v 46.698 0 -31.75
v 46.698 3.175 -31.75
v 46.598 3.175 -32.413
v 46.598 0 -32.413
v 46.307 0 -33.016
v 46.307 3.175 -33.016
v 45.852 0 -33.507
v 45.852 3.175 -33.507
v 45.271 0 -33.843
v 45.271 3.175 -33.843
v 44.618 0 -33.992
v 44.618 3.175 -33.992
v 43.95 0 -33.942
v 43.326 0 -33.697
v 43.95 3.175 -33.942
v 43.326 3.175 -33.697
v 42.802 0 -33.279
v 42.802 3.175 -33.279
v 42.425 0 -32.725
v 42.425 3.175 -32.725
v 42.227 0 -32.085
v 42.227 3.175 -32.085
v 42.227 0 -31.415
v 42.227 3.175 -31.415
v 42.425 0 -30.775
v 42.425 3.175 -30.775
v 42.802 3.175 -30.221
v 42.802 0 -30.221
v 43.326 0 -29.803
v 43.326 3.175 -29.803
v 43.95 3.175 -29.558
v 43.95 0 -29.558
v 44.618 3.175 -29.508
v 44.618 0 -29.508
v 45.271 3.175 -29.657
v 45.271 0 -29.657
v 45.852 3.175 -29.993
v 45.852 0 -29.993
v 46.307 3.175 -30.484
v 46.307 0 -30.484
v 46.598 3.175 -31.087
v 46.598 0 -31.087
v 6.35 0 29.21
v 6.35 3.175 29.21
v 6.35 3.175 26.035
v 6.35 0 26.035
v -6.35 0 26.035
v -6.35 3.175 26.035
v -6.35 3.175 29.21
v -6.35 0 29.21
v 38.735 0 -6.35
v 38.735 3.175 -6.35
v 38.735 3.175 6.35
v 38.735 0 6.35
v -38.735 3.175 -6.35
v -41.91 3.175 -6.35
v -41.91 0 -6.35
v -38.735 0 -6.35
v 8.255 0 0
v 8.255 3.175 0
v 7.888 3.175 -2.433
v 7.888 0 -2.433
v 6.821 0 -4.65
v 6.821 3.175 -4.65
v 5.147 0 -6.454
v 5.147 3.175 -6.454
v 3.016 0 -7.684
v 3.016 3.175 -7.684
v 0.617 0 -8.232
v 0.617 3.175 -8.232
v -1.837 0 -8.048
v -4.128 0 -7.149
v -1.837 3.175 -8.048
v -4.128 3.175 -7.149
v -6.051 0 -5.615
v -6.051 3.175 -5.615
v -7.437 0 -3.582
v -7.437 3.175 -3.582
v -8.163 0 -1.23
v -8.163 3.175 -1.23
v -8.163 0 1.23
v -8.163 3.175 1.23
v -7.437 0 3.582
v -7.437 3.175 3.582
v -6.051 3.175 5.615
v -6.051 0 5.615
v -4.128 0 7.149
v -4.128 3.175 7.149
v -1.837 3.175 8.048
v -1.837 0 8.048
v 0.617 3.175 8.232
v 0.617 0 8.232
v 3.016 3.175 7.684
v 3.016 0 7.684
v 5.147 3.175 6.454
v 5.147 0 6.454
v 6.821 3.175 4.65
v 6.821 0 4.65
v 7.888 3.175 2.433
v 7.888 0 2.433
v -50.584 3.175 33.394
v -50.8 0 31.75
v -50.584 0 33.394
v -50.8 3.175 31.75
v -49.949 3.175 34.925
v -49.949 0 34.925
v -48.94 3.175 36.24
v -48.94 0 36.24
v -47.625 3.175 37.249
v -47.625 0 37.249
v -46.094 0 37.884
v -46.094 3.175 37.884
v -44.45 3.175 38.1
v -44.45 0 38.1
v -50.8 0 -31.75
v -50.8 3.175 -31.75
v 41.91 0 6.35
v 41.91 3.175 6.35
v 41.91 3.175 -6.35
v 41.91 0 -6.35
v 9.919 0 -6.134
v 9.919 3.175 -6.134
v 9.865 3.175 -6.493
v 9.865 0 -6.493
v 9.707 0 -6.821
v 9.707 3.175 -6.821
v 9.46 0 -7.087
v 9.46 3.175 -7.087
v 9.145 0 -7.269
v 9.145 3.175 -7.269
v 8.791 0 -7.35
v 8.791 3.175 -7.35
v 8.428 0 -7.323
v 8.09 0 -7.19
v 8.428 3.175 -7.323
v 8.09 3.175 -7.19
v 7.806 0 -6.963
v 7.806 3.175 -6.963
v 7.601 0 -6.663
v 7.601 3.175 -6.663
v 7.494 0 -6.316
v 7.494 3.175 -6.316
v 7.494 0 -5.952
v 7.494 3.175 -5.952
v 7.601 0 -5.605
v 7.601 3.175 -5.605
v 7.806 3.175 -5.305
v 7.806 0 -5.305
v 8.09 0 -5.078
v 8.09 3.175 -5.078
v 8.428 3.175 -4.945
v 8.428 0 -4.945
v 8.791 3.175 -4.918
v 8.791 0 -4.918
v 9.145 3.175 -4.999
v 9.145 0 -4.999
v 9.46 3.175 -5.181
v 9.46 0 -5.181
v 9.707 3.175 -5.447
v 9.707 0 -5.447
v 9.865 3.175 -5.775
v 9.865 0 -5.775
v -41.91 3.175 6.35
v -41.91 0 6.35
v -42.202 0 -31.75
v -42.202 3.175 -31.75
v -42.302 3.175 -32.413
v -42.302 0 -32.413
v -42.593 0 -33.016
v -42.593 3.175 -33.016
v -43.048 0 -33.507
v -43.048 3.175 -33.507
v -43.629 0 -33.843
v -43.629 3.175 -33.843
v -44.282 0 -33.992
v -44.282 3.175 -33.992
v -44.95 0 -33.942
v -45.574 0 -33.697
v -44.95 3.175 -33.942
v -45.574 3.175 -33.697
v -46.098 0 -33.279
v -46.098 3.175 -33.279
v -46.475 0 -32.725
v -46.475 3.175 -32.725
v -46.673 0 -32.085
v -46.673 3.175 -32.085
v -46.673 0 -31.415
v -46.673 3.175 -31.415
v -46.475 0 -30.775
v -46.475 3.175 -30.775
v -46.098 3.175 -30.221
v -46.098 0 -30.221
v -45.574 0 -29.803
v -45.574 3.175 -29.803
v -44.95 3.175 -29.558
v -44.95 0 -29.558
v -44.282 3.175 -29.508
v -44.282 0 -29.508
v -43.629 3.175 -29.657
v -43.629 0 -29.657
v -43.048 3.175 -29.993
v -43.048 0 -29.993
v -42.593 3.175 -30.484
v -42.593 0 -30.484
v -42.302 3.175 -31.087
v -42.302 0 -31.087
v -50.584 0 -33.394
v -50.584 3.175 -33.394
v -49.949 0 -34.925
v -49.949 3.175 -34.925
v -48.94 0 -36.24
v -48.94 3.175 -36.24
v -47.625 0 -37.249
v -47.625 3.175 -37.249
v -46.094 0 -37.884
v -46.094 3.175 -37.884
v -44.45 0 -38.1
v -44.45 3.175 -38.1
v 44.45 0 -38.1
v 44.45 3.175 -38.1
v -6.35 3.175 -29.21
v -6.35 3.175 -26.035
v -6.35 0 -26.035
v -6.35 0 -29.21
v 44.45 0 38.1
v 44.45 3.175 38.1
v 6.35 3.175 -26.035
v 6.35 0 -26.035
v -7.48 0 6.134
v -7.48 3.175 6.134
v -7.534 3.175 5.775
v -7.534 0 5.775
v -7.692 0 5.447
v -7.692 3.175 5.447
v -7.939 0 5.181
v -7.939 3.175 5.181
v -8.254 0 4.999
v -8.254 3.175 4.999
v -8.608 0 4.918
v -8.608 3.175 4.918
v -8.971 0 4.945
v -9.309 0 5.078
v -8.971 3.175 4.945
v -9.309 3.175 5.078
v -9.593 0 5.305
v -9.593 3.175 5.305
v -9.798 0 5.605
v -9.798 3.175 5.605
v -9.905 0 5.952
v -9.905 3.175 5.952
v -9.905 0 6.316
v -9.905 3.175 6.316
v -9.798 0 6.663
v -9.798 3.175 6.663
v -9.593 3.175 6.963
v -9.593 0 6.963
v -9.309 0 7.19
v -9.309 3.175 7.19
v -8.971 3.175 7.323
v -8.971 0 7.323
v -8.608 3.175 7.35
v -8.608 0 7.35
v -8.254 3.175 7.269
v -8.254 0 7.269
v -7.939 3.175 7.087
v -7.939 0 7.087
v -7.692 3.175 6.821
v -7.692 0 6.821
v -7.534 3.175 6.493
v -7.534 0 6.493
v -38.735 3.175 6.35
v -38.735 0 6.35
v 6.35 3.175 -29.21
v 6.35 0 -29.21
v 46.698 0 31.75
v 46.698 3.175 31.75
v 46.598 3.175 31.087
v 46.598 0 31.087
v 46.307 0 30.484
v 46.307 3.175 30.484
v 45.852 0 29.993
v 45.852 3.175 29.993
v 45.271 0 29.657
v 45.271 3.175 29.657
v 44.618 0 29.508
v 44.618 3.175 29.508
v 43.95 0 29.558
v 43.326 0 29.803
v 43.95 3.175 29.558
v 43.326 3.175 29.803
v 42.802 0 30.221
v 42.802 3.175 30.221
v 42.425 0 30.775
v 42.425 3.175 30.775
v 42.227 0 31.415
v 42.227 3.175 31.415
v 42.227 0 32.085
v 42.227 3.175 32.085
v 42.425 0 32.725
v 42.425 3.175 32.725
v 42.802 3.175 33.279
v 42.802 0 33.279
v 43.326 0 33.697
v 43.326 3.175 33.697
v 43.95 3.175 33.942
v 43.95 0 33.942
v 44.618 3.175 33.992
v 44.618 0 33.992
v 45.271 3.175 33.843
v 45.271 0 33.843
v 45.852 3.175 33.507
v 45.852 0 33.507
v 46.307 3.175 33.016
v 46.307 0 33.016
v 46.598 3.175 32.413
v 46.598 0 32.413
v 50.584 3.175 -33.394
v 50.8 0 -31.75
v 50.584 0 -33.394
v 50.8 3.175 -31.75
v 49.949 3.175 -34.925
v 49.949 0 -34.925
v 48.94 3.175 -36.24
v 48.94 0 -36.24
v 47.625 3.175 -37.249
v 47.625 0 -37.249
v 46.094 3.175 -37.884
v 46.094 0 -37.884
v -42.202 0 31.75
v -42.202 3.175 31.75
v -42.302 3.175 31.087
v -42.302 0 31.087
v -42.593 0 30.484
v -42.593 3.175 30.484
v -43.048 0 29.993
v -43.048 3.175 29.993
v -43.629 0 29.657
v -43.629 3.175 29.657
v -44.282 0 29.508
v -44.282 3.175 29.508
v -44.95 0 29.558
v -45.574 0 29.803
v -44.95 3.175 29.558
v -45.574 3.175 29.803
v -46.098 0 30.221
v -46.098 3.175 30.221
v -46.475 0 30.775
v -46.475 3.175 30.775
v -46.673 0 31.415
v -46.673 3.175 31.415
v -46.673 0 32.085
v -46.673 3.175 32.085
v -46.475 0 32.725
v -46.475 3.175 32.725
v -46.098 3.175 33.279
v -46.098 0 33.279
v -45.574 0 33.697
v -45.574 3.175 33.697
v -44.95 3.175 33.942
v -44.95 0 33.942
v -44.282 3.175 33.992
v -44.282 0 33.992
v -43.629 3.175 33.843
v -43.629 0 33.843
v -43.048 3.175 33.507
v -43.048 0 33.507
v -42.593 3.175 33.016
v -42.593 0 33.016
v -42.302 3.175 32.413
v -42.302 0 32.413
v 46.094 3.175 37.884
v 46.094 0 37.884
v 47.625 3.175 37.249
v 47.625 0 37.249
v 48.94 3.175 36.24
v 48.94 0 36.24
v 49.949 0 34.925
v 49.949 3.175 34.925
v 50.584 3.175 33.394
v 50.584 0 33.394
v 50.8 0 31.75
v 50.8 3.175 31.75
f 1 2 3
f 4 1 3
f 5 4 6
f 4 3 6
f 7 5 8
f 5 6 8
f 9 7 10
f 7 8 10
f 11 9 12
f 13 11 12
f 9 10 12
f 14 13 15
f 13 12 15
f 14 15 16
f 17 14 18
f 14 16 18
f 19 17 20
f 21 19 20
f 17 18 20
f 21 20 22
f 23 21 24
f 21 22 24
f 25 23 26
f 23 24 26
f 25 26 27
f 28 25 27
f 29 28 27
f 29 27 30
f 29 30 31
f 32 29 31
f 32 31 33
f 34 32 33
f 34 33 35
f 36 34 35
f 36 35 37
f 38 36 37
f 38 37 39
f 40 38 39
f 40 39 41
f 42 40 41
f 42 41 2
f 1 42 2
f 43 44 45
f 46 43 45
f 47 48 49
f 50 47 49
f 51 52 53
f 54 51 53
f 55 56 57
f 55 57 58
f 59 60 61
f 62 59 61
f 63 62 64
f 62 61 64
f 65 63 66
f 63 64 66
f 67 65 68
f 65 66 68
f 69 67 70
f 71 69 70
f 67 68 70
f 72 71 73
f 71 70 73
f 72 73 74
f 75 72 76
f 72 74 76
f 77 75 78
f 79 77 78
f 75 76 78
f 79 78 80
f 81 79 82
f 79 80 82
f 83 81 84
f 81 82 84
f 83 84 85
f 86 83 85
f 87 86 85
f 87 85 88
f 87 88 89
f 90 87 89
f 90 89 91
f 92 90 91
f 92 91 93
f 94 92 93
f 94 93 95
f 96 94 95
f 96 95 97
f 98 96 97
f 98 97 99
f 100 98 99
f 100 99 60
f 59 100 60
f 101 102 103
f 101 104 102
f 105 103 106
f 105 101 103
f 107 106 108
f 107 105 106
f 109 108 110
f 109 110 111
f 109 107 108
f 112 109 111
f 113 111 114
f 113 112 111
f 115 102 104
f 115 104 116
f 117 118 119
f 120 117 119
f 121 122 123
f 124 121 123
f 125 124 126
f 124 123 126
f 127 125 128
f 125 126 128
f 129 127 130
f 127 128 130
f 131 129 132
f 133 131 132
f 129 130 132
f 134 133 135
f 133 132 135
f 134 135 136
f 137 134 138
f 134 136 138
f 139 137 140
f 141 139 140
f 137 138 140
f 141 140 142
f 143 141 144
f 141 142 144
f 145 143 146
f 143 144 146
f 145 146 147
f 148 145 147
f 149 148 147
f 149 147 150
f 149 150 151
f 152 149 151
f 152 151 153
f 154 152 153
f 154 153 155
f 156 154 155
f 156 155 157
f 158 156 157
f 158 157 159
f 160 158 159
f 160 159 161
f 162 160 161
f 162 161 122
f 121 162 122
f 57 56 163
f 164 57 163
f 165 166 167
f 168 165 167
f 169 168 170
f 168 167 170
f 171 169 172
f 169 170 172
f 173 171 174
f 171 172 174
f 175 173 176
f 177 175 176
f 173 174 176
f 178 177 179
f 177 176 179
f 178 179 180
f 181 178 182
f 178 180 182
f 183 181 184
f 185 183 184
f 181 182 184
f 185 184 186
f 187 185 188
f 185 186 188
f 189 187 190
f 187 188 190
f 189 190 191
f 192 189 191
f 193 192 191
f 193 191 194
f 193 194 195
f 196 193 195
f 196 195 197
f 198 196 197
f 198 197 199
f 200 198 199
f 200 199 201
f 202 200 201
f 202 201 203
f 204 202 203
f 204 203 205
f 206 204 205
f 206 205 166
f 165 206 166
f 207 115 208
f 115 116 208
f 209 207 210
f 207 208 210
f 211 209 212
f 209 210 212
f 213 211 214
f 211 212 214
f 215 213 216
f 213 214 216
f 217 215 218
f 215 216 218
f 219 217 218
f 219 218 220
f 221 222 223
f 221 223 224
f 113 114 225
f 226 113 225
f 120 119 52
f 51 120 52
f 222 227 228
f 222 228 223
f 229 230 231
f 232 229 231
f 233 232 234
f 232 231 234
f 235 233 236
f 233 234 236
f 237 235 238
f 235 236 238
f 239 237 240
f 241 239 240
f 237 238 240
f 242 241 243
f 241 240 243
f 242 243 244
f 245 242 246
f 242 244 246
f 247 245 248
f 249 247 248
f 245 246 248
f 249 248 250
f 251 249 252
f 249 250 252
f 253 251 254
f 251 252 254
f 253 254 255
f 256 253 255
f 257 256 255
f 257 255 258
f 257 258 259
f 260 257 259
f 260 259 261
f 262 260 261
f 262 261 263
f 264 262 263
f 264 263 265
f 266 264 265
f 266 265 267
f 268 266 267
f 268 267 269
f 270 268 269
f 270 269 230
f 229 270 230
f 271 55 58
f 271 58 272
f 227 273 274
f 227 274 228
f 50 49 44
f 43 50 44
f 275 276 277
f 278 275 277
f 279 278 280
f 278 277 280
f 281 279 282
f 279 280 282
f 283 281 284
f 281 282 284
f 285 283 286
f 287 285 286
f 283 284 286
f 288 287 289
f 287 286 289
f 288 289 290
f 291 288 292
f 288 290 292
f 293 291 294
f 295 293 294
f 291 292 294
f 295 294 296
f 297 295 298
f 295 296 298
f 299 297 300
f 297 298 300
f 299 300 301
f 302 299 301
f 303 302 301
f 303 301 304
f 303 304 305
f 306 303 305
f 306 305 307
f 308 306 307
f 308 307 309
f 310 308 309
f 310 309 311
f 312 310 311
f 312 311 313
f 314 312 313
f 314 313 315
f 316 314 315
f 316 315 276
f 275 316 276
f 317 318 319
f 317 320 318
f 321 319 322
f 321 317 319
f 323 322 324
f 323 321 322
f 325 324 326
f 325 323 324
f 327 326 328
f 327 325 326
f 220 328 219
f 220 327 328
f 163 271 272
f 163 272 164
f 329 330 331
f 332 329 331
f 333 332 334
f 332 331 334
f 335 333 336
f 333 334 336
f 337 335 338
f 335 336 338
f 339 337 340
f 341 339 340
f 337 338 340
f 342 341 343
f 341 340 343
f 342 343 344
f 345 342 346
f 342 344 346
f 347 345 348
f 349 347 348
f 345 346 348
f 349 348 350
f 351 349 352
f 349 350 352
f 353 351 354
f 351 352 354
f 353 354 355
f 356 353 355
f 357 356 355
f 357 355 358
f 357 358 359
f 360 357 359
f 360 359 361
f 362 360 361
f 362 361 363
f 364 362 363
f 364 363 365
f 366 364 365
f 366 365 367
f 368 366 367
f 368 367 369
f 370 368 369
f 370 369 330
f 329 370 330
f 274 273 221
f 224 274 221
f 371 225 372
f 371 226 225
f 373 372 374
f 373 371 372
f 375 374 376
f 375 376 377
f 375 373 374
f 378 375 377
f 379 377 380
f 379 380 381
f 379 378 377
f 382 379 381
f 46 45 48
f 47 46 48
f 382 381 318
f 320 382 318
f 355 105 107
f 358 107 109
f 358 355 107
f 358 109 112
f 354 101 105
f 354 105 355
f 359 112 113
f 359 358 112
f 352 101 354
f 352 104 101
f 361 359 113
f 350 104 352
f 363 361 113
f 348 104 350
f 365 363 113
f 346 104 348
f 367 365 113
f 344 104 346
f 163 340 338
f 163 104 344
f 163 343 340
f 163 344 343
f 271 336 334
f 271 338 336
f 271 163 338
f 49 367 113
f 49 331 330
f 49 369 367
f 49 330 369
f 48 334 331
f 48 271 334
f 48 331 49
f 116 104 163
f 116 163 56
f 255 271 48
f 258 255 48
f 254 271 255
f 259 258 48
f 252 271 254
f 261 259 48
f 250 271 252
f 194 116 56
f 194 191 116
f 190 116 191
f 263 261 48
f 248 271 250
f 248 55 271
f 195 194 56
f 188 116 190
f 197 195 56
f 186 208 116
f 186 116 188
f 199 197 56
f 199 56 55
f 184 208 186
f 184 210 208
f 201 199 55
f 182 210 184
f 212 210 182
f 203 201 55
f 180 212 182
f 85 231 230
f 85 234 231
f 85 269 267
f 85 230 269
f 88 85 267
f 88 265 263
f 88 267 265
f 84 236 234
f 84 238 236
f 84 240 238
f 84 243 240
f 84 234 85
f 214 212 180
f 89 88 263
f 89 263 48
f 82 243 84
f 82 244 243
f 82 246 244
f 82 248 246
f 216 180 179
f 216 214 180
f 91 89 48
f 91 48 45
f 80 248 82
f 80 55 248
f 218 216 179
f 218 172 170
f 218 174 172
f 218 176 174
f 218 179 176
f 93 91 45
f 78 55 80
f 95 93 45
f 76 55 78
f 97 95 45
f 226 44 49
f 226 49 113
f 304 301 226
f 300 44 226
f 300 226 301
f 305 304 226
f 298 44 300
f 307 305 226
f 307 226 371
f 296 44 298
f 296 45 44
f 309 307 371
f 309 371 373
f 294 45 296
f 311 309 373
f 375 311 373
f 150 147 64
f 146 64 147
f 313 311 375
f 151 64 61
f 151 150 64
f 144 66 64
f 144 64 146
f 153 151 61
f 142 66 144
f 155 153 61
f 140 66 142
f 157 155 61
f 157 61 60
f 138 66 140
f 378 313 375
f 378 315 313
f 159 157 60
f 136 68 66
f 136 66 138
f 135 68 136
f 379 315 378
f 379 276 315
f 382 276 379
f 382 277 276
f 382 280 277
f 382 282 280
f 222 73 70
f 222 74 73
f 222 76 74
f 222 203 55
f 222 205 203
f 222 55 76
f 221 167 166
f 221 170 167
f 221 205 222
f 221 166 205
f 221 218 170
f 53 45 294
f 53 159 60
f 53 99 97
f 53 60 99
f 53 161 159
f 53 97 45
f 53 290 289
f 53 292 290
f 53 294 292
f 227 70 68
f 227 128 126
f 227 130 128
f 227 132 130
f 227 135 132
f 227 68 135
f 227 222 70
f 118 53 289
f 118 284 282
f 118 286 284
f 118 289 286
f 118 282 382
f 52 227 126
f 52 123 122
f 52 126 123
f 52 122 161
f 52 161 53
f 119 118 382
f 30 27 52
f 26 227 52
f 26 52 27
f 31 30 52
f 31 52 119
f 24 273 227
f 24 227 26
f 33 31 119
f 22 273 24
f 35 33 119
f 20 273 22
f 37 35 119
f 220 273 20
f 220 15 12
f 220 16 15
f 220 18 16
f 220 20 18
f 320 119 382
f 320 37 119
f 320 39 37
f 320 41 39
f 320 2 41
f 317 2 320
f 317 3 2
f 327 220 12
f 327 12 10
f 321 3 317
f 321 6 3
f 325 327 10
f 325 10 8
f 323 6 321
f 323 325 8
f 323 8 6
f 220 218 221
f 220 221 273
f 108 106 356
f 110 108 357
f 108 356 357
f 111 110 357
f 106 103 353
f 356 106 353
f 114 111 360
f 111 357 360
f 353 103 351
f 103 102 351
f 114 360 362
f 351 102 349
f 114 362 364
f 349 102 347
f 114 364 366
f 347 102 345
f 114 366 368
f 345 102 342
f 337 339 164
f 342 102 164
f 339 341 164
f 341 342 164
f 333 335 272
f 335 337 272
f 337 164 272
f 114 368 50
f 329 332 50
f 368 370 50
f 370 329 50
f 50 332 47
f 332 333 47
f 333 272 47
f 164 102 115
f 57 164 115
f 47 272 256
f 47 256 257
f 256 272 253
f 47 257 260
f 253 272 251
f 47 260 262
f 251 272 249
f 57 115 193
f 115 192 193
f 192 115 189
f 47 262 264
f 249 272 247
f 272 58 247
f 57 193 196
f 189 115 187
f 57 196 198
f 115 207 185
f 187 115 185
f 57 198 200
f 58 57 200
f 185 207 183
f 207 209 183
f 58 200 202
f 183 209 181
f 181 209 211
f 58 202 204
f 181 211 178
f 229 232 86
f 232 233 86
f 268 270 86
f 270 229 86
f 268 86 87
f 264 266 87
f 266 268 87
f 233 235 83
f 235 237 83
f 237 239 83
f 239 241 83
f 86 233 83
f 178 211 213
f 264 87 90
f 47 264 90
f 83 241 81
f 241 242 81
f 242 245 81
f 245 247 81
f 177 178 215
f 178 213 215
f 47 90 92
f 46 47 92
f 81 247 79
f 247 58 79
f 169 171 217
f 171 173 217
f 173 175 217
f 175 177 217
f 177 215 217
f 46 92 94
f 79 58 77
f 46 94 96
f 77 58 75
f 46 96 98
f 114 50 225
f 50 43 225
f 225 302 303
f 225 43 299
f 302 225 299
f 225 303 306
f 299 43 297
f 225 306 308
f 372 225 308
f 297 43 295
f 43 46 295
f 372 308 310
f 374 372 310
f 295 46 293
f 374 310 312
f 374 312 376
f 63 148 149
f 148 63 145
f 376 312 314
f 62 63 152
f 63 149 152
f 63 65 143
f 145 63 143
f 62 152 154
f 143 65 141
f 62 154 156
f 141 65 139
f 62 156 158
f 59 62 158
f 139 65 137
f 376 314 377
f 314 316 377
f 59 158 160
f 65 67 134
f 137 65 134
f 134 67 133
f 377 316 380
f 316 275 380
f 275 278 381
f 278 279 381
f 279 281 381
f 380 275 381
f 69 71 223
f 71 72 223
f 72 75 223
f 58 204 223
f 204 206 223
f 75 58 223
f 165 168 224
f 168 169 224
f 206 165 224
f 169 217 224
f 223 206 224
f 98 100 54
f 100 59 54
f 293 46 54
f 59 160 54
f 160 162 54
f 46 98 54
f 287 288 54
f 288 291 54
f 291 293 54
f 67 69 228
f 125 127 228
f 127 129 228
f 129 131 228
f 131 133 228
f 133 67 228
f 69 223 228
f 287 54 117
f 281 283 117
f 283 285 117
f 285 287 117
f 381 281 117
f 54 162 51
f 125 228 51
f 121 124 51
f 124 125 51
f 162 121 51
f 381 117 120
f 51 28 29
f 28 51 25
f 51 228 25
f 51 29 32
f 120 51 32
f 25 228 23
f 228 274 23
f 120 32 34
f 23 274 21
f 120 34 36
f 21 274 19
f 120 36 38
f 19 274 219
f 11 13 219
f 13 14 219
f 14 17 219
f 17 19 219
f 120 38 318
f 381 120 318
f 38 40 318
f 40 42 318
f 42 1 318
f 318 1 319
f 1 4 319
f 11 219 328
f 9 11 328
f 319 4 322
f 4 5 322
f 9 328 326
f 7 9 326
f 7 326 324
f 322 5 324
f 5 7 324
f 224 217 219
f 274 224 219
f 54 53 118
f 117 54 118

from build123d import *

# Parameters (mm, degrees)
SKETCH1_W           = 101.6
SKETCH1_H           = 76.2
BOSS_EXTRUDE1_DEPTH = 3.175
FILLET1_R           = 6.35
SKETCH2_R           = 2.2479
CUT_EXTRUDE1_DEPTH  = 4.175
SKETCH3_R           = 8.255
SKETCH3_R_2         = 1.2192
CUT_EXTRUDE2_DEPTH  = 4.175


with BuildPart() as part:
    # Sketch1 → Boss-Extrude1 (new body)
    with BuildSketch(Plane(origin=(0, 0, 0), x_dir=(1, 0, 0), z_dir=(0, 1, 0))):
        Rectangle(SKETCH1_W, SKETCH1_H)
    extrude(amount=BOSS_EXTRUDE1_DEPTH)

    # Fillet1
    fillet1_edges = [part.edges().sort_by_distance(p)[0] for p in [
        (50.8, 1.5875, 38.1),
        (-50.8, 1.5875, 38.1),
        (-50.8, 1.5875, -38.1),
        (50.8, 1.5875, -38.1),
    ]]
    fillet(fillet1_edges, radius=FILLET1_R)

    # Sketch2 → Cut-Extrude1 (cut, through all)
    with BuildSketch(Plane(origin=(0, 3.175, 0), x_dir=(1, 0, 0), z_dir=(0, 1, 0))):
        with Locations((-44.45, 31.75)):
            Circle(SKETCH2_R)
        with Locations((44.45, 31.75)):
            Circle(SKETCH2_R)
        with Locations((44.45, -31.75)):
            Circle(SKETCH2_R)
        with Locations((-44.45, -31.75)):
            Circle(SKETCH2_R)
        Polygon((-41.91, 0), (-41.91, 6.35), (-38.735, 6.35), (-38.735, -6.35), (-41.91, -6.35), align=None)
        Polygon((0, 29.21), (6.35, 29.21), (6.35, 26.035), (-6.35, 26.035), (-6.35, 29.21), align=None)
        Polygon((41.91, 0), (41.91, 6.35), (38.735, 6.35), (38.735, -6.35), (41.91, -6.35), align=None)
        Polygon((0, -29.21), (6.35, -29.21), (6.35, -26.035), (-6.35, -26.035), (-6.35, -29.21), align=None)
    extrude(amount=-CUT_EXTRUDE1_DEPTH, mode=Mode.SUBTRACT)

    # Sketch3 → Cut-Extrude2 (cut, through all)
    with BuildSketch(Plane(origin=(0, 3.175, 0), x_dir=(1, 0, 0), z_dir=(0, 1, 0))):
        Circle(SKETCH3_R)
        with Locations((-8.6995, -6.1341)):
            Circle(SKETCH3_R_2)
        with Locations((8.6995, 6.1341)):
            Circle(SKETCH3_R_2)
    extrude(amount=-CUT_EXTRUDE2_DEPTH, mode=Mode.SUBTRACT)


solid = part.part
